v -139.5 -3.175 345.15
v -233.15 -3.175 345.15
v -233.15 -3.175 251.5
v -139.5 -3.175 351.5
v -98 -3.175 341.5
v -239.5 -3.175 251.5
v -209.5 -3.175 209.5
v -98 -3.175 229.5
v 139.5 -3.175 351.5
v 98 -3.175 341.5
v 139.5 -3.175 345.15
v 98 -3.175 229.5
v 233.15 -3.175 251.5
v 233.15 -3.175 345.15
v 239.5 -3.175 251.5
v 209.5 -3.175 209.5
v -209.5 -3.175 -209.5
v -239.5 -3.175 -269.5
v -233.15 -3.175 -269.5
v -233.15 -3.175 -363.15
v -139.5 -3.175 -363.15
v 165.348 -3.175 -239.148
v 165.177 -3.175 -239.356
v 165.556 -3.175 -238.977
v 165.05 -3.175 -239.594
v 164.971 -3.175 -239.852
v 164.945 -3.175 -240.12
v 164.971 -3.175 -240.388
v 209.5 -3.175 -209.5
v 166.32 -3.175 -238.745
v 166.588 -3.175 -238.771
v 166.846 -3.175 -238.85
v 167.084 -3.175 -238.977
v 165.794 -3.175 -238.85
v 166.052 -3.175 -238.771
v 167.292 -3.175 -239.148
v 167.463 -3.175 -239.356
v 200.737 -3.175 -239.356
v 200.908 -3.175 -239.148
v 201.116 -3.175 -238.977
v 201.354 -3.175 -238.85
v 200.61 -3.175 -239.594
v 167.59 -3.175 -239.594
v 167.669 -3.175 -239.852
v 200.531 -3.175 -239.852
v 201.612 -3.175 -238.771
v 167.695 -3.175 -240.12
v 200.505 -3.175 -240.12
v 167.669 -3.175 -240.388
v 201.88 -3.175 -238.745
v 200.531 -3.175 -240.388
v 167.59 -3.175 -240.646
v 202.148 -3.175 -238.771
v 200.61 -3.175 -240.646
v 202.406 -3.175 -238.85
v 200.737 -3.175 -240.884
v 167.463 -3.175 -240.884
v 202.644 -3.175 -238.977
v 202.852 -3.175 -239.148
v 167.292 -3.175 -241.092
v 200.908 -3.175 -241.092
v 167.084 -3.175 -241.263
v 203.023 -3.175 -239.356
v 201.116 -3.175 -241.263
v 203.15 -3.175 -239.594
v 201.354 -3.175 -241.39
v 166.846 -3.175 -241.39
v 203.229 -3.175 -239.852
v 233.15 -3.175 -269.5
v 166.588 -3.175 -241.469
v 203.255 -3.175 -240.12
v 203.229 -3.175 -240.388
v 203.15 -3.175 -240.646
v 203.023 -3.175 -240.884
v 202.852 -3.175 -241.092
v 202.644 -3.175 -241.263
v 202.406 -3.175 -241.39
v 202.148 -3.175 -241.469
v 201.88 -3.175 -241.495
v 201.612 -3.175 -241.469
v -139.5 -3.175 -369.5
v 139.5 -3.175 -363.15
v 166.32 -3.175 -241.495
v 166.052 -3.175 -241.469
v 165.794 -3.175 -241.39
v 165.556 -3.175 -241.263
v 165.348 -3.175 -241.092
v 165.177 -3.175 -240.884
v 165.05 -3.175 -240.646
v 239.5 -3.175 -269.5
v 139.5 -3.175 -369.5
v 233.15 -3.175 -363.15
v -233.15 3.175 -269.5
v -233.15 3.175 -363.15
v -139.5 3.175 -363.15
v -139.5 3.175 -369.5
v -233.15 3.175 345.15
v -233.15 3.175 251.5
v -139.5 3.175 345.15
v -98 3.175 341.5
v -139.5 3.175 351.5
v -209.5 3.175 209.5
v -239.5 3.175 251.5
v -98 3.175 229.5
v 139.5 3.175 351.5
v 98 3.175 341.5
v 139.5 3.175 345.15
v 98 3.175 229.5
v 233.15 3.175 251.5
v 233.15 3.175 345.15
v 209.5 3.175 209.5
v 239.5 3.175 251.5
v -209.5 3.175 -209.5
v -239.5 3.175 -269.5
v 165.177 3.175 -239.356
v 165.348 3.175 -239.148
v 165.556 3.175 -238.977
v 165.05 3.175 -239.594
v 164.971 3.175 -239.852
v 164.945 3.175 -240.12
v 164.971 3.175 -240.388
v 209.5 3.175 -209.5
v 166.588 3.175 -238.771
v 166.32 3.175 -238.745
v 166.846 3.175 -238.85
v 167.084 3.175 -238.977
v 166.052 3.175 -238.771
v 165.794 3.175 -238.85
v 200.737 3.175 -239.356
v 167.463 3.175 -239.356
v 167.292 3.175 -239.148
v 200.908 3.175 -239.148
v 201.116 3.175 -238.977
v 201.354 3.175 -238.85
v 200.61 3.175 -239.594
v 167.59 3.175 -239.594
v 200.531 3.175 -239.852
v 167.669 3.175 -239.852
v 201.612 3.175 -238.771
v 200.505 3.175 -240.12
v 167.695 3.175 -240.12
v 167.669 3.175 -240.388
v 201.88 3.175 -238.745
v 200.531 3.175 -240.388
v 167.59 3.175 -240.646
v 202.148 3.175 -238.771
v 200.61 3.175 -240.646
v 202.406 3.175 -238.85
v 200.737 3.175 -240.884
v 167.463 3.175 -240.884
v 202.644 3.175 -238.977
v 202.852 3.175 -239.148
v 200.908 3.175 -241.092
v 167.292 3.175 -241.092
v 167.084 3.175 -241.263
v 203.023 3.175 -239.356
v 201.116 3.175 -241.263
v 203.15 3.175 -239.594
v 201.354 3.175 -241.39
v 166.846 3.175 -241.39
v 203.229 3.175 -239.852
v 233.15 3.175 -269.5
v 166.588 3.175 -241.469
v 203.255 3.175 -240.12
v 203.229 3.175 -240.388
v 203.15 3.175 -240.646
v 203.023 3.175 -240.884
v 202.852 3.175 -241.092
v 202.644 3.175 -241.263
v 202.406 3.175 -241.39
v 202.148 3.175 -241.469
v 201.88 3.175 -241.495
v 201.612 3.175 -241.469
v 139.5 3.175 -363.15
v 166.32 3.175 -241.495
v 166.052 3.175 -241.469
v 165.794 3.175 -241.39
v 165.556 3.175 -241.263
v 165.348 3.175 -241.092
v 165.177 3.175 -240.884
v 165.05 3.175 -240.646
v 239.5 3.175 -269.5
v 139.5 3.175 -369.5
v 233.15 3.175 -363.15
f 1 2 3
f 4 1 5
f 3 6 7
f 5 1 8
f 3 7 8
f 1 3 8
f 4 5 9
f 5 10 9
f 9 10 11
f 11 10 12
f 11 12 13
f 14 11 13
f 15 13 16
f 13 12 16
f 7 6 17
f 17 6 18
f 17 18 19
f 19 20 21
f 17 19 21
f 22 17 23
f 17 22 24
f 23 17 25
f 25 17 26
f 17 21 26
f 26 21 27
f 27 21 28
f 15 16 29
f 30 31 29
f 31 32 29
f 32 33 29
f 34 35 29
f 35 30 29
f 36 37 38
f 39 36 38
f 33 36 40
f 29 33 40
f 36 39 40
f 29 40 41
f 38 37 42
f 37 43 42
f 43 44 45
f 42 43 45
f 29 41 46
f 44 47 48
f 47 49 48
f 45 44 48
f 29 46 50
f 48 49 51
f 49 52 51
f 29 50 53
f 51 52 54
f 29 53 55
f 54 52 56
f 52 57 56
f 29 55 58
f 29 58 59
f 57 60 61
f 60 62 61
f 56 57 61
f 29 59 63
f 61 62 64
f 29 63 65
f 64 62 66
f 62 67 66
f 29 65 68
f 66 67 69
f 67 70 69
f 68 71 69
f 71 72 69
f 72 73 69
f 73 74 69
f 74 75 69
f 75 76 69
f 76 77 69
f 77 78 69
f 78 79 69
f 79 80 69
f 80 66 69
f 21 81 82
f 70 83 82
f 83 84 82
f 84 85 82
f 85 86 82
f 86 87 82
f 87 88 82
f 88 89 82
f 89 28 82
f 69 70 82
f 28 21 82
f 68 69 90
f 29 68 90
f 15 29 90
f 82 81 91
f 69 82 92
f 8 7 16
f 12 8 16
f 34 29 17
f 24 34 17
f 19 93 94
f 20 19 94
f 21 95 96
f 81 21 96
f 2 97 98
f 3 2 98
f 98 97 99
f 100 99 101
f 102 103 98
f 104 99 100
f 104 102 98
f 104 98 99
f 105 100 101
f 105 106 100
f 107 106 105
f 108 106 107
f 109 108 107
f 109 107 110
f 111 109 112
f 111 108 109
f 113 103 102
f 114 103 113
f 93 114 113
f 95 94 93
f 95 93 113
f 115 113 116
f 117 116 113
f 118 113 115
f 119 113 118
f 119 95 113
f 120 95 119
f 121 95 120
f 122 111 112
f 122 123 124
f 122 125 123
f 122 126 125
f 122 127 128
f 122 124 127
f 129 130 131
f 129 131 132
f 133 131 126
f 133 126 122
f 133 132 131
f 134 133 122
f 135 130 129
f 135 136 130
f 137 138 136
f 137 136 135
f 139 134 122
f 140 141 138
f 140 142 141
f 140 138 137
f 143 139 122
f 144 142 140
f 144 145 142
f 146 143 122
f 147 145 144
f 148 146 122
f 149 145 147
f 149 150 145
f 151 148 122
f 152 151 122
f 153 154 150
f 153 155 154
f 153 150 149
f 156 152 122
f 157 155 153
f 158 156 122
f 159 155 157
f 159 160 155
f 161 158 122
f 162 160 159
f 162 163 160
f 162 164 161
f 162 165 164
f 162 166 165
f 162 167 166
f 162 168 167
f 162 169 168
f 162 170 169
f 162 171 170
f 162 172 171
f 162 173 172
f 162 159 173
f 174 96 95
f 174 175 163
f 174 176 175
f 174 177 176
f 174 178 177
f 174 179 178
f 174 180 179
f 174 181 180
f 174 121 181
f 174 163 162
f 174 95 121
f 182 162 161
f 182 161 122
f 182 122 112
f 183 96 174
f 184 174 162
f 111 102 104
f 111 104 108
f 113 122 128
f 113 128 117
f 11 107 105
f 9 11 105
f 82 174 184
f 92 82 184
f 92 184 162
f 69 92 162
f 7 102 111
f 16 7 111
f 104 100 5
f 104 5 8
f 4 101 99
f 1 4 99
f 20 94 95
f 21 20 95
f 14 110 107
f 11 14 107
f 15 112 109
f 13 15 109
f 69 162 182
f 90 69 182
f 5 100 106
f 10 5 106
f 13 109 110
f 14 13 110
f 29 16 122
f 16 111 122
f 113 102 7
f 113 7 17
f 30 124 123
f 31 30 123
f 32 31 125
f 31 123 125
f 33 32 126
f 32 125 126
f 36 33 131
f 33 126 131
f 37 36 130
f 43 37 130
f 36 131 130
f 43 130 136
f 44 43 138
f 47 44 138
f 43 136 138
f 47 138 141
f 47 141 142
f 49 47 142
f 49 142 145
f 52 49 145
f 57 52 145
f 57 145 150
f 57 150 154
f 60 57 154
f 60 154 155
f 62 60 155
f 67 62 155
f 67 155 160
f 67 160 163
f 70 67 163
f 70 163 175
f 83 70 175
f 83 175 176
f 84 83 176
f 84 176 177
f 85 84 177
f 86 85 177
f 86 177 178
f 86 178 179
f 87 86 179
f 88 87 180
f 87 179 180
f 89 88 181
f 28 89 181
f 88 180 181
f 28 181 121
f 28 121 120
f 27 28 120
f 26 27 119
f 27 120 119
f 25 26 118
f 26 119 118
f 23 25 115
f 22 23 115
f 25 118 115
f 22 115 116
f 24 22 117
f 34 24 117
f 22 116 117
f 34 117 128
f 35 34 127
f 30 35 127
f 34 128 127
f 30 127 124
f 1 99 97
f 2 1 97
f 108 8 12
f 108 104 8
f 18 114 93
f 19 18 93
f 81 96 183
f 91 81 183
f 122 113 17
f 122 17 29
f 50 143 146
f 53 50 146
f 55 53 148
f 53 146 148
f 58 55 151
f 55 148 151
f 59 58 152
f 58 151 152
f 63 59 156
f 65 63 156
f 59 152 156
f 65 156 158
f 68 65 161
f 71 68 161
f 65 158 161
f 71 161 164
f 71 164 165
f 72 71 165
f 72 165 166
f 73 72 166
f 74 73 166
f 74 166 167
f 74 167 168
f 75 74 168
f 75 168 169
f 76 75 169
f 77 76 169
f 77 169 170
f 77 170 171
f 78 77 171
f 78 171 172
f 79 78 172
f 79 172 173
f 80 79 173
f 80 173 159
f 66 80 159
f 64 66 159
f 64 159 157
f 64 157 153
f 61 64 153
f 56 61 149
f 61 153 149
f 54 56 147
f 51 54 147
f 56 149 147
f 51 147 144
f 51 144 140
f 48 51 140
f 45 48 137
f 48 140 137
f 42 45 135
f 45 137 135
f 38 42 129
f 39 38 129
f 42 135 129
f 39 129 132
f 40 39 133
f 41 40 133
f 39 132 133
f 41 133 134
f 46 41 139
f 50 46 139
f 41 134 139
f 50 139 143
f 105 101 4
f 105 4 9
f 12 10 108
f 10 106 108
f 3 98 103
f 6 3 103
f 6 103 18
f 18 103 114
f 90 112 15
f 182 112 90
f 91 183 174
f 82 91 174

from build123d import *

# Parameters (mm, degrees)
SKETCH1_W           = 479
SKETCH1_H           = 721
SKETCH1_W_2         = 419
SKETCH1_H_2         = 419
SKETCH1_W_3         = 196
SKETCH1_H_3         = 112
BOSS_EXTRUDE1_DEPTH = 3.175
CUT_EXTRUDE1_DEPTH  = 441.375774197
SKETCH3_R           = 1.375
CUT_EXTRUDE2_DEPTH  = 441.375774197


with BuildPart() as part:
    # Sketch1 → Boss-Extrude1 (new, symmetric)
    with BuildSketch(Plane(origin=(0, 0, 0), x_dir=(1, 0, 0), z_dir=(0, 1, 0))):
        with Locations((0, 9)):
            Rectangle(SKETCH1_W, SKETCH1_H)
        Rectangle(SKETCH1_W_2, SKETCH1_H_2, mode=Mode.SUBTRACT)
        with Locations((0, -285.5)):
            Rectangle(SKETCH1_W_3, SKETCH1_H_3, mode=Mode.SUBTRACT)
    extrude(amount=BOSS_EXTRUDE1_DEPTH, both=True)

    # Sketch2 → Cut-Extrude1 (cut, through all)
    with BuildSketch(Plane(origin=(0, 3.175, 0), x_dir=(1, 0, 0), z_dir=(0, 1, 0))):
        Polygon((-239.5, 369.5), (-239.5, 269.5), (-233.15, 269.5), (-233.15, 363.15), (-139.5, 363.15), (-139.5, 369.5), align=None)
        Polygon((239.5, 369.5), (139.5, 369.5), (139.5, 363.15), (233.15, 363.15), (233.15, 269.5), (239.5, 269.5), align=None)
        Polygon((239.5, -351.5), (239.5, -251.5), (233.15, -251.5), (233.15, -345.15), (139.5, -345.15), (139.5, -351.5), align=None)
        Polygon((-239.5, -351.5), (-139.5, -351.5), (-139.5, -345.15), (-233.15, -345.15), (-233.15, -251.5), (-239.5, -251.5), align=None)
    extrude(amount=-CUT_EXTRUDE1_DEPTH, mode=Mode.SUBTRACT)

    # Sketch3 → Cut-Extrude2 (cut, through all)
    with BuildSketch(Plane(origin=(0, 3.175, 0), x_dir=(1, 0, 0), z_dir=(0, 1, 0))):
        with Locations(Location((166.32, 240.12, 0), (0, 0, 270))):
            Circle(SKETCH3_R)
        with Locations(Location((201.88, 240.12, 0), (0, 0, 270))):
            Circle(SKETCH3_R)
    extrude(amount=-CUT_EXTRUDE2_DEPTH, mode=Mode.SUBTRACT)


solid = part.part
